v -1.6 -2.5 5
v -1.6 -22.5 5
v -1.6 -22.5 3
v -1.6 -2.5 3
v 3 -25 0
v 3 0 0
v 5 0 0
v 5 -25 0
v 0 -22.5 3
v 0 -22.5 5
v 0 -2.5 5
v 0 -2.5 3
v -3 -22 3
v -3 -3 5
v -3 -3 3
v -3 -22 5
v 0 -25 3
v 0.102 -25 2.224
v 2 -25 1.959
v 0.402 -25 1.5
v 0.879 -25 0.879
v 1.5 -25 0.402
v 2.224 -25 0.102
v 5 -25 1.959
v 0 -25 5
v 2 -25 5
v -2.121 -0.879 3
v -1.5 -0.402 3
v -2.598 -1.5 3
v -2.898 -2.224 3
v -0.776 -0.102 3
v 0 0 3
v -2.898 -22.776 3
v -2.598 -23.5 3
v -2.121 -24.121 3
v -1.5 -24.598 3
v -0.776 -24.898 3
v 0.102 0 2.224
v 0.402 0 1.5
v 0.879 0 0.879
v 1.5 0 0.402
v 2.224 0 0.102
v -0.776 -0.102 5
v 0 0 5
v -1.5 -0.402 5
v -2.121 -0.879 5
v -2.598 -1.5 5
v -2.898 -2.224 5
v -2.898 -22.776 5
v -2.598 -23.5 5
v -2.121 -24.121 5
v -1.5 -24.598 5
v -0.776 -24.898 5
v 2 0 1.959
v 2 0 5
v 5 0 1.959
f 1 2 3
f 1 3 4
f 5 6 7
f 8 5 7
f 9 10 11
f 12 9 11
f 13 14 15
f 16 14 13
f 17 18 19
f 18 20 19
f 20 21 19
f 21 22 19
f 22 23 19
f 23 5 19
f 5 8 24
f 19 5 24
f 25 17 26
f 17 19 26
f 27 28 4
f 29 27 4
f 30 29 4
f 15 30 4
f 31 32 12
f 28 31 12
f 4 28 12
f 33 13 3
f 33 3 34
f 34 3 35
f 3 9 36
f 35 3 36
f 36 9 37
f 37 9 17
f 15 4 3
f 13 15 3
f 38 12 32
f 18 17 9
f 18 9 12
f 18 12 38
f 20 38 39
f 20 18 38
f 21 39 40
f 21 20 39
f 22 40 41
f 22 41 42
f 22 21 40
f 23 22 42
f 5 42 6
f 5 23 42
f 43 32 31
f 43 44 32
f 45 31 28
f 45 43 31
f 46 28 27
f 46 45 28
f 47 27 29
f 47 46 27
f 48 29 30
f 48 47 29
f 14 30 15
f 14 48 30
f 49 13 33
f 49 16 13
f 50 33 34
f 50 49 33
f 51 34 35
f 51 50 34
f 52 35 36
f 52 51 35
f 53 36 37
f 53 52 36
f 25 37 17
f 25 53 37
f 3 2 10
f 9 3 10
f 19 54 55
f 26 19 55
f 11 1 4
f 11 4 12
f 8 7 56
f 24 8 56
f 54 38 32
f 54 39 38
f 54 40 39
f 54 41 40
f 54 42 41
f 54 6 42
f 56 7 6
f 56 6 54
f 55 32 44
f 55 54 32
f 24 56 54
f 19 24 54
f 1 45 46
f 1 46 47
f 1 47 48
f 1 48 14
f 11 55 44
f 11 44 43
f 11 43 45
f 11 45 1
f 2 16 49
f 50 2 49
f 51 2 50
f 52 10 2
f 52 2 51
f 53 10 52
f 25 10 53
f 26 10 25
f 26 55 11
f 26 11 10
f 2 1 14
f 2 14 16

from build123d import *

# Parameters (mm, degrees)
F1_DEPTH = 25
F2_R     = 3
F3_W     = 25
F3_H     = 2
F4_DEPTH = 3
F5_W     = 1.6
F5_H     = 20
F6_DEPTH = 12.5
F7_R     = 3


with BuildPart() as f1:
    # F0 (on Front) → F1 (new body)
    with BuildSketch(Plane.XZ):
        Polygon((2, 5), (0, 5), (0, 0), (5, 0), (5, 1.95942), (2, 1.95942), align=None)
    extrude(amount=F1_DEPTH)

    # F2
    f2_edges = [f1.edges().sort_by_distance(p)[0] for p in [
        (0, -12.5, 0),
    ]]
    fillet(f2_edges, radius=F2_R)

    # F3 (on face) → F4 (join)
    with BuildSketch(Plane(origin=(0, 0, 0), x_dir=(0, -1, 0), z_dir=(-1, 0, 0))):
        with Locations((12.5, 4)):
            Rectangle(F3_W, F3_H)
    extrude(amount=F4_DEPTH)

    # F5 (on face) → F6 (cut, symmetric)
    with BuildSketch(Plane.XY.offset(5)):
        with Locations((-0.8, -12.5)):
            Rectangle(F5_W, F5_H)
    extrude(amount=F6_DEPTH, both=True, mode=Mode.SUBTRACT)

    # F7
    f7_edges = [f1.edges().sort_by_distance(p)[0] for p in [
        (-3, 0, 4),
        (-3, -25, 4),
    ]]
    fillet(f7_edges, radius=F7_R)


solid = f1.part
